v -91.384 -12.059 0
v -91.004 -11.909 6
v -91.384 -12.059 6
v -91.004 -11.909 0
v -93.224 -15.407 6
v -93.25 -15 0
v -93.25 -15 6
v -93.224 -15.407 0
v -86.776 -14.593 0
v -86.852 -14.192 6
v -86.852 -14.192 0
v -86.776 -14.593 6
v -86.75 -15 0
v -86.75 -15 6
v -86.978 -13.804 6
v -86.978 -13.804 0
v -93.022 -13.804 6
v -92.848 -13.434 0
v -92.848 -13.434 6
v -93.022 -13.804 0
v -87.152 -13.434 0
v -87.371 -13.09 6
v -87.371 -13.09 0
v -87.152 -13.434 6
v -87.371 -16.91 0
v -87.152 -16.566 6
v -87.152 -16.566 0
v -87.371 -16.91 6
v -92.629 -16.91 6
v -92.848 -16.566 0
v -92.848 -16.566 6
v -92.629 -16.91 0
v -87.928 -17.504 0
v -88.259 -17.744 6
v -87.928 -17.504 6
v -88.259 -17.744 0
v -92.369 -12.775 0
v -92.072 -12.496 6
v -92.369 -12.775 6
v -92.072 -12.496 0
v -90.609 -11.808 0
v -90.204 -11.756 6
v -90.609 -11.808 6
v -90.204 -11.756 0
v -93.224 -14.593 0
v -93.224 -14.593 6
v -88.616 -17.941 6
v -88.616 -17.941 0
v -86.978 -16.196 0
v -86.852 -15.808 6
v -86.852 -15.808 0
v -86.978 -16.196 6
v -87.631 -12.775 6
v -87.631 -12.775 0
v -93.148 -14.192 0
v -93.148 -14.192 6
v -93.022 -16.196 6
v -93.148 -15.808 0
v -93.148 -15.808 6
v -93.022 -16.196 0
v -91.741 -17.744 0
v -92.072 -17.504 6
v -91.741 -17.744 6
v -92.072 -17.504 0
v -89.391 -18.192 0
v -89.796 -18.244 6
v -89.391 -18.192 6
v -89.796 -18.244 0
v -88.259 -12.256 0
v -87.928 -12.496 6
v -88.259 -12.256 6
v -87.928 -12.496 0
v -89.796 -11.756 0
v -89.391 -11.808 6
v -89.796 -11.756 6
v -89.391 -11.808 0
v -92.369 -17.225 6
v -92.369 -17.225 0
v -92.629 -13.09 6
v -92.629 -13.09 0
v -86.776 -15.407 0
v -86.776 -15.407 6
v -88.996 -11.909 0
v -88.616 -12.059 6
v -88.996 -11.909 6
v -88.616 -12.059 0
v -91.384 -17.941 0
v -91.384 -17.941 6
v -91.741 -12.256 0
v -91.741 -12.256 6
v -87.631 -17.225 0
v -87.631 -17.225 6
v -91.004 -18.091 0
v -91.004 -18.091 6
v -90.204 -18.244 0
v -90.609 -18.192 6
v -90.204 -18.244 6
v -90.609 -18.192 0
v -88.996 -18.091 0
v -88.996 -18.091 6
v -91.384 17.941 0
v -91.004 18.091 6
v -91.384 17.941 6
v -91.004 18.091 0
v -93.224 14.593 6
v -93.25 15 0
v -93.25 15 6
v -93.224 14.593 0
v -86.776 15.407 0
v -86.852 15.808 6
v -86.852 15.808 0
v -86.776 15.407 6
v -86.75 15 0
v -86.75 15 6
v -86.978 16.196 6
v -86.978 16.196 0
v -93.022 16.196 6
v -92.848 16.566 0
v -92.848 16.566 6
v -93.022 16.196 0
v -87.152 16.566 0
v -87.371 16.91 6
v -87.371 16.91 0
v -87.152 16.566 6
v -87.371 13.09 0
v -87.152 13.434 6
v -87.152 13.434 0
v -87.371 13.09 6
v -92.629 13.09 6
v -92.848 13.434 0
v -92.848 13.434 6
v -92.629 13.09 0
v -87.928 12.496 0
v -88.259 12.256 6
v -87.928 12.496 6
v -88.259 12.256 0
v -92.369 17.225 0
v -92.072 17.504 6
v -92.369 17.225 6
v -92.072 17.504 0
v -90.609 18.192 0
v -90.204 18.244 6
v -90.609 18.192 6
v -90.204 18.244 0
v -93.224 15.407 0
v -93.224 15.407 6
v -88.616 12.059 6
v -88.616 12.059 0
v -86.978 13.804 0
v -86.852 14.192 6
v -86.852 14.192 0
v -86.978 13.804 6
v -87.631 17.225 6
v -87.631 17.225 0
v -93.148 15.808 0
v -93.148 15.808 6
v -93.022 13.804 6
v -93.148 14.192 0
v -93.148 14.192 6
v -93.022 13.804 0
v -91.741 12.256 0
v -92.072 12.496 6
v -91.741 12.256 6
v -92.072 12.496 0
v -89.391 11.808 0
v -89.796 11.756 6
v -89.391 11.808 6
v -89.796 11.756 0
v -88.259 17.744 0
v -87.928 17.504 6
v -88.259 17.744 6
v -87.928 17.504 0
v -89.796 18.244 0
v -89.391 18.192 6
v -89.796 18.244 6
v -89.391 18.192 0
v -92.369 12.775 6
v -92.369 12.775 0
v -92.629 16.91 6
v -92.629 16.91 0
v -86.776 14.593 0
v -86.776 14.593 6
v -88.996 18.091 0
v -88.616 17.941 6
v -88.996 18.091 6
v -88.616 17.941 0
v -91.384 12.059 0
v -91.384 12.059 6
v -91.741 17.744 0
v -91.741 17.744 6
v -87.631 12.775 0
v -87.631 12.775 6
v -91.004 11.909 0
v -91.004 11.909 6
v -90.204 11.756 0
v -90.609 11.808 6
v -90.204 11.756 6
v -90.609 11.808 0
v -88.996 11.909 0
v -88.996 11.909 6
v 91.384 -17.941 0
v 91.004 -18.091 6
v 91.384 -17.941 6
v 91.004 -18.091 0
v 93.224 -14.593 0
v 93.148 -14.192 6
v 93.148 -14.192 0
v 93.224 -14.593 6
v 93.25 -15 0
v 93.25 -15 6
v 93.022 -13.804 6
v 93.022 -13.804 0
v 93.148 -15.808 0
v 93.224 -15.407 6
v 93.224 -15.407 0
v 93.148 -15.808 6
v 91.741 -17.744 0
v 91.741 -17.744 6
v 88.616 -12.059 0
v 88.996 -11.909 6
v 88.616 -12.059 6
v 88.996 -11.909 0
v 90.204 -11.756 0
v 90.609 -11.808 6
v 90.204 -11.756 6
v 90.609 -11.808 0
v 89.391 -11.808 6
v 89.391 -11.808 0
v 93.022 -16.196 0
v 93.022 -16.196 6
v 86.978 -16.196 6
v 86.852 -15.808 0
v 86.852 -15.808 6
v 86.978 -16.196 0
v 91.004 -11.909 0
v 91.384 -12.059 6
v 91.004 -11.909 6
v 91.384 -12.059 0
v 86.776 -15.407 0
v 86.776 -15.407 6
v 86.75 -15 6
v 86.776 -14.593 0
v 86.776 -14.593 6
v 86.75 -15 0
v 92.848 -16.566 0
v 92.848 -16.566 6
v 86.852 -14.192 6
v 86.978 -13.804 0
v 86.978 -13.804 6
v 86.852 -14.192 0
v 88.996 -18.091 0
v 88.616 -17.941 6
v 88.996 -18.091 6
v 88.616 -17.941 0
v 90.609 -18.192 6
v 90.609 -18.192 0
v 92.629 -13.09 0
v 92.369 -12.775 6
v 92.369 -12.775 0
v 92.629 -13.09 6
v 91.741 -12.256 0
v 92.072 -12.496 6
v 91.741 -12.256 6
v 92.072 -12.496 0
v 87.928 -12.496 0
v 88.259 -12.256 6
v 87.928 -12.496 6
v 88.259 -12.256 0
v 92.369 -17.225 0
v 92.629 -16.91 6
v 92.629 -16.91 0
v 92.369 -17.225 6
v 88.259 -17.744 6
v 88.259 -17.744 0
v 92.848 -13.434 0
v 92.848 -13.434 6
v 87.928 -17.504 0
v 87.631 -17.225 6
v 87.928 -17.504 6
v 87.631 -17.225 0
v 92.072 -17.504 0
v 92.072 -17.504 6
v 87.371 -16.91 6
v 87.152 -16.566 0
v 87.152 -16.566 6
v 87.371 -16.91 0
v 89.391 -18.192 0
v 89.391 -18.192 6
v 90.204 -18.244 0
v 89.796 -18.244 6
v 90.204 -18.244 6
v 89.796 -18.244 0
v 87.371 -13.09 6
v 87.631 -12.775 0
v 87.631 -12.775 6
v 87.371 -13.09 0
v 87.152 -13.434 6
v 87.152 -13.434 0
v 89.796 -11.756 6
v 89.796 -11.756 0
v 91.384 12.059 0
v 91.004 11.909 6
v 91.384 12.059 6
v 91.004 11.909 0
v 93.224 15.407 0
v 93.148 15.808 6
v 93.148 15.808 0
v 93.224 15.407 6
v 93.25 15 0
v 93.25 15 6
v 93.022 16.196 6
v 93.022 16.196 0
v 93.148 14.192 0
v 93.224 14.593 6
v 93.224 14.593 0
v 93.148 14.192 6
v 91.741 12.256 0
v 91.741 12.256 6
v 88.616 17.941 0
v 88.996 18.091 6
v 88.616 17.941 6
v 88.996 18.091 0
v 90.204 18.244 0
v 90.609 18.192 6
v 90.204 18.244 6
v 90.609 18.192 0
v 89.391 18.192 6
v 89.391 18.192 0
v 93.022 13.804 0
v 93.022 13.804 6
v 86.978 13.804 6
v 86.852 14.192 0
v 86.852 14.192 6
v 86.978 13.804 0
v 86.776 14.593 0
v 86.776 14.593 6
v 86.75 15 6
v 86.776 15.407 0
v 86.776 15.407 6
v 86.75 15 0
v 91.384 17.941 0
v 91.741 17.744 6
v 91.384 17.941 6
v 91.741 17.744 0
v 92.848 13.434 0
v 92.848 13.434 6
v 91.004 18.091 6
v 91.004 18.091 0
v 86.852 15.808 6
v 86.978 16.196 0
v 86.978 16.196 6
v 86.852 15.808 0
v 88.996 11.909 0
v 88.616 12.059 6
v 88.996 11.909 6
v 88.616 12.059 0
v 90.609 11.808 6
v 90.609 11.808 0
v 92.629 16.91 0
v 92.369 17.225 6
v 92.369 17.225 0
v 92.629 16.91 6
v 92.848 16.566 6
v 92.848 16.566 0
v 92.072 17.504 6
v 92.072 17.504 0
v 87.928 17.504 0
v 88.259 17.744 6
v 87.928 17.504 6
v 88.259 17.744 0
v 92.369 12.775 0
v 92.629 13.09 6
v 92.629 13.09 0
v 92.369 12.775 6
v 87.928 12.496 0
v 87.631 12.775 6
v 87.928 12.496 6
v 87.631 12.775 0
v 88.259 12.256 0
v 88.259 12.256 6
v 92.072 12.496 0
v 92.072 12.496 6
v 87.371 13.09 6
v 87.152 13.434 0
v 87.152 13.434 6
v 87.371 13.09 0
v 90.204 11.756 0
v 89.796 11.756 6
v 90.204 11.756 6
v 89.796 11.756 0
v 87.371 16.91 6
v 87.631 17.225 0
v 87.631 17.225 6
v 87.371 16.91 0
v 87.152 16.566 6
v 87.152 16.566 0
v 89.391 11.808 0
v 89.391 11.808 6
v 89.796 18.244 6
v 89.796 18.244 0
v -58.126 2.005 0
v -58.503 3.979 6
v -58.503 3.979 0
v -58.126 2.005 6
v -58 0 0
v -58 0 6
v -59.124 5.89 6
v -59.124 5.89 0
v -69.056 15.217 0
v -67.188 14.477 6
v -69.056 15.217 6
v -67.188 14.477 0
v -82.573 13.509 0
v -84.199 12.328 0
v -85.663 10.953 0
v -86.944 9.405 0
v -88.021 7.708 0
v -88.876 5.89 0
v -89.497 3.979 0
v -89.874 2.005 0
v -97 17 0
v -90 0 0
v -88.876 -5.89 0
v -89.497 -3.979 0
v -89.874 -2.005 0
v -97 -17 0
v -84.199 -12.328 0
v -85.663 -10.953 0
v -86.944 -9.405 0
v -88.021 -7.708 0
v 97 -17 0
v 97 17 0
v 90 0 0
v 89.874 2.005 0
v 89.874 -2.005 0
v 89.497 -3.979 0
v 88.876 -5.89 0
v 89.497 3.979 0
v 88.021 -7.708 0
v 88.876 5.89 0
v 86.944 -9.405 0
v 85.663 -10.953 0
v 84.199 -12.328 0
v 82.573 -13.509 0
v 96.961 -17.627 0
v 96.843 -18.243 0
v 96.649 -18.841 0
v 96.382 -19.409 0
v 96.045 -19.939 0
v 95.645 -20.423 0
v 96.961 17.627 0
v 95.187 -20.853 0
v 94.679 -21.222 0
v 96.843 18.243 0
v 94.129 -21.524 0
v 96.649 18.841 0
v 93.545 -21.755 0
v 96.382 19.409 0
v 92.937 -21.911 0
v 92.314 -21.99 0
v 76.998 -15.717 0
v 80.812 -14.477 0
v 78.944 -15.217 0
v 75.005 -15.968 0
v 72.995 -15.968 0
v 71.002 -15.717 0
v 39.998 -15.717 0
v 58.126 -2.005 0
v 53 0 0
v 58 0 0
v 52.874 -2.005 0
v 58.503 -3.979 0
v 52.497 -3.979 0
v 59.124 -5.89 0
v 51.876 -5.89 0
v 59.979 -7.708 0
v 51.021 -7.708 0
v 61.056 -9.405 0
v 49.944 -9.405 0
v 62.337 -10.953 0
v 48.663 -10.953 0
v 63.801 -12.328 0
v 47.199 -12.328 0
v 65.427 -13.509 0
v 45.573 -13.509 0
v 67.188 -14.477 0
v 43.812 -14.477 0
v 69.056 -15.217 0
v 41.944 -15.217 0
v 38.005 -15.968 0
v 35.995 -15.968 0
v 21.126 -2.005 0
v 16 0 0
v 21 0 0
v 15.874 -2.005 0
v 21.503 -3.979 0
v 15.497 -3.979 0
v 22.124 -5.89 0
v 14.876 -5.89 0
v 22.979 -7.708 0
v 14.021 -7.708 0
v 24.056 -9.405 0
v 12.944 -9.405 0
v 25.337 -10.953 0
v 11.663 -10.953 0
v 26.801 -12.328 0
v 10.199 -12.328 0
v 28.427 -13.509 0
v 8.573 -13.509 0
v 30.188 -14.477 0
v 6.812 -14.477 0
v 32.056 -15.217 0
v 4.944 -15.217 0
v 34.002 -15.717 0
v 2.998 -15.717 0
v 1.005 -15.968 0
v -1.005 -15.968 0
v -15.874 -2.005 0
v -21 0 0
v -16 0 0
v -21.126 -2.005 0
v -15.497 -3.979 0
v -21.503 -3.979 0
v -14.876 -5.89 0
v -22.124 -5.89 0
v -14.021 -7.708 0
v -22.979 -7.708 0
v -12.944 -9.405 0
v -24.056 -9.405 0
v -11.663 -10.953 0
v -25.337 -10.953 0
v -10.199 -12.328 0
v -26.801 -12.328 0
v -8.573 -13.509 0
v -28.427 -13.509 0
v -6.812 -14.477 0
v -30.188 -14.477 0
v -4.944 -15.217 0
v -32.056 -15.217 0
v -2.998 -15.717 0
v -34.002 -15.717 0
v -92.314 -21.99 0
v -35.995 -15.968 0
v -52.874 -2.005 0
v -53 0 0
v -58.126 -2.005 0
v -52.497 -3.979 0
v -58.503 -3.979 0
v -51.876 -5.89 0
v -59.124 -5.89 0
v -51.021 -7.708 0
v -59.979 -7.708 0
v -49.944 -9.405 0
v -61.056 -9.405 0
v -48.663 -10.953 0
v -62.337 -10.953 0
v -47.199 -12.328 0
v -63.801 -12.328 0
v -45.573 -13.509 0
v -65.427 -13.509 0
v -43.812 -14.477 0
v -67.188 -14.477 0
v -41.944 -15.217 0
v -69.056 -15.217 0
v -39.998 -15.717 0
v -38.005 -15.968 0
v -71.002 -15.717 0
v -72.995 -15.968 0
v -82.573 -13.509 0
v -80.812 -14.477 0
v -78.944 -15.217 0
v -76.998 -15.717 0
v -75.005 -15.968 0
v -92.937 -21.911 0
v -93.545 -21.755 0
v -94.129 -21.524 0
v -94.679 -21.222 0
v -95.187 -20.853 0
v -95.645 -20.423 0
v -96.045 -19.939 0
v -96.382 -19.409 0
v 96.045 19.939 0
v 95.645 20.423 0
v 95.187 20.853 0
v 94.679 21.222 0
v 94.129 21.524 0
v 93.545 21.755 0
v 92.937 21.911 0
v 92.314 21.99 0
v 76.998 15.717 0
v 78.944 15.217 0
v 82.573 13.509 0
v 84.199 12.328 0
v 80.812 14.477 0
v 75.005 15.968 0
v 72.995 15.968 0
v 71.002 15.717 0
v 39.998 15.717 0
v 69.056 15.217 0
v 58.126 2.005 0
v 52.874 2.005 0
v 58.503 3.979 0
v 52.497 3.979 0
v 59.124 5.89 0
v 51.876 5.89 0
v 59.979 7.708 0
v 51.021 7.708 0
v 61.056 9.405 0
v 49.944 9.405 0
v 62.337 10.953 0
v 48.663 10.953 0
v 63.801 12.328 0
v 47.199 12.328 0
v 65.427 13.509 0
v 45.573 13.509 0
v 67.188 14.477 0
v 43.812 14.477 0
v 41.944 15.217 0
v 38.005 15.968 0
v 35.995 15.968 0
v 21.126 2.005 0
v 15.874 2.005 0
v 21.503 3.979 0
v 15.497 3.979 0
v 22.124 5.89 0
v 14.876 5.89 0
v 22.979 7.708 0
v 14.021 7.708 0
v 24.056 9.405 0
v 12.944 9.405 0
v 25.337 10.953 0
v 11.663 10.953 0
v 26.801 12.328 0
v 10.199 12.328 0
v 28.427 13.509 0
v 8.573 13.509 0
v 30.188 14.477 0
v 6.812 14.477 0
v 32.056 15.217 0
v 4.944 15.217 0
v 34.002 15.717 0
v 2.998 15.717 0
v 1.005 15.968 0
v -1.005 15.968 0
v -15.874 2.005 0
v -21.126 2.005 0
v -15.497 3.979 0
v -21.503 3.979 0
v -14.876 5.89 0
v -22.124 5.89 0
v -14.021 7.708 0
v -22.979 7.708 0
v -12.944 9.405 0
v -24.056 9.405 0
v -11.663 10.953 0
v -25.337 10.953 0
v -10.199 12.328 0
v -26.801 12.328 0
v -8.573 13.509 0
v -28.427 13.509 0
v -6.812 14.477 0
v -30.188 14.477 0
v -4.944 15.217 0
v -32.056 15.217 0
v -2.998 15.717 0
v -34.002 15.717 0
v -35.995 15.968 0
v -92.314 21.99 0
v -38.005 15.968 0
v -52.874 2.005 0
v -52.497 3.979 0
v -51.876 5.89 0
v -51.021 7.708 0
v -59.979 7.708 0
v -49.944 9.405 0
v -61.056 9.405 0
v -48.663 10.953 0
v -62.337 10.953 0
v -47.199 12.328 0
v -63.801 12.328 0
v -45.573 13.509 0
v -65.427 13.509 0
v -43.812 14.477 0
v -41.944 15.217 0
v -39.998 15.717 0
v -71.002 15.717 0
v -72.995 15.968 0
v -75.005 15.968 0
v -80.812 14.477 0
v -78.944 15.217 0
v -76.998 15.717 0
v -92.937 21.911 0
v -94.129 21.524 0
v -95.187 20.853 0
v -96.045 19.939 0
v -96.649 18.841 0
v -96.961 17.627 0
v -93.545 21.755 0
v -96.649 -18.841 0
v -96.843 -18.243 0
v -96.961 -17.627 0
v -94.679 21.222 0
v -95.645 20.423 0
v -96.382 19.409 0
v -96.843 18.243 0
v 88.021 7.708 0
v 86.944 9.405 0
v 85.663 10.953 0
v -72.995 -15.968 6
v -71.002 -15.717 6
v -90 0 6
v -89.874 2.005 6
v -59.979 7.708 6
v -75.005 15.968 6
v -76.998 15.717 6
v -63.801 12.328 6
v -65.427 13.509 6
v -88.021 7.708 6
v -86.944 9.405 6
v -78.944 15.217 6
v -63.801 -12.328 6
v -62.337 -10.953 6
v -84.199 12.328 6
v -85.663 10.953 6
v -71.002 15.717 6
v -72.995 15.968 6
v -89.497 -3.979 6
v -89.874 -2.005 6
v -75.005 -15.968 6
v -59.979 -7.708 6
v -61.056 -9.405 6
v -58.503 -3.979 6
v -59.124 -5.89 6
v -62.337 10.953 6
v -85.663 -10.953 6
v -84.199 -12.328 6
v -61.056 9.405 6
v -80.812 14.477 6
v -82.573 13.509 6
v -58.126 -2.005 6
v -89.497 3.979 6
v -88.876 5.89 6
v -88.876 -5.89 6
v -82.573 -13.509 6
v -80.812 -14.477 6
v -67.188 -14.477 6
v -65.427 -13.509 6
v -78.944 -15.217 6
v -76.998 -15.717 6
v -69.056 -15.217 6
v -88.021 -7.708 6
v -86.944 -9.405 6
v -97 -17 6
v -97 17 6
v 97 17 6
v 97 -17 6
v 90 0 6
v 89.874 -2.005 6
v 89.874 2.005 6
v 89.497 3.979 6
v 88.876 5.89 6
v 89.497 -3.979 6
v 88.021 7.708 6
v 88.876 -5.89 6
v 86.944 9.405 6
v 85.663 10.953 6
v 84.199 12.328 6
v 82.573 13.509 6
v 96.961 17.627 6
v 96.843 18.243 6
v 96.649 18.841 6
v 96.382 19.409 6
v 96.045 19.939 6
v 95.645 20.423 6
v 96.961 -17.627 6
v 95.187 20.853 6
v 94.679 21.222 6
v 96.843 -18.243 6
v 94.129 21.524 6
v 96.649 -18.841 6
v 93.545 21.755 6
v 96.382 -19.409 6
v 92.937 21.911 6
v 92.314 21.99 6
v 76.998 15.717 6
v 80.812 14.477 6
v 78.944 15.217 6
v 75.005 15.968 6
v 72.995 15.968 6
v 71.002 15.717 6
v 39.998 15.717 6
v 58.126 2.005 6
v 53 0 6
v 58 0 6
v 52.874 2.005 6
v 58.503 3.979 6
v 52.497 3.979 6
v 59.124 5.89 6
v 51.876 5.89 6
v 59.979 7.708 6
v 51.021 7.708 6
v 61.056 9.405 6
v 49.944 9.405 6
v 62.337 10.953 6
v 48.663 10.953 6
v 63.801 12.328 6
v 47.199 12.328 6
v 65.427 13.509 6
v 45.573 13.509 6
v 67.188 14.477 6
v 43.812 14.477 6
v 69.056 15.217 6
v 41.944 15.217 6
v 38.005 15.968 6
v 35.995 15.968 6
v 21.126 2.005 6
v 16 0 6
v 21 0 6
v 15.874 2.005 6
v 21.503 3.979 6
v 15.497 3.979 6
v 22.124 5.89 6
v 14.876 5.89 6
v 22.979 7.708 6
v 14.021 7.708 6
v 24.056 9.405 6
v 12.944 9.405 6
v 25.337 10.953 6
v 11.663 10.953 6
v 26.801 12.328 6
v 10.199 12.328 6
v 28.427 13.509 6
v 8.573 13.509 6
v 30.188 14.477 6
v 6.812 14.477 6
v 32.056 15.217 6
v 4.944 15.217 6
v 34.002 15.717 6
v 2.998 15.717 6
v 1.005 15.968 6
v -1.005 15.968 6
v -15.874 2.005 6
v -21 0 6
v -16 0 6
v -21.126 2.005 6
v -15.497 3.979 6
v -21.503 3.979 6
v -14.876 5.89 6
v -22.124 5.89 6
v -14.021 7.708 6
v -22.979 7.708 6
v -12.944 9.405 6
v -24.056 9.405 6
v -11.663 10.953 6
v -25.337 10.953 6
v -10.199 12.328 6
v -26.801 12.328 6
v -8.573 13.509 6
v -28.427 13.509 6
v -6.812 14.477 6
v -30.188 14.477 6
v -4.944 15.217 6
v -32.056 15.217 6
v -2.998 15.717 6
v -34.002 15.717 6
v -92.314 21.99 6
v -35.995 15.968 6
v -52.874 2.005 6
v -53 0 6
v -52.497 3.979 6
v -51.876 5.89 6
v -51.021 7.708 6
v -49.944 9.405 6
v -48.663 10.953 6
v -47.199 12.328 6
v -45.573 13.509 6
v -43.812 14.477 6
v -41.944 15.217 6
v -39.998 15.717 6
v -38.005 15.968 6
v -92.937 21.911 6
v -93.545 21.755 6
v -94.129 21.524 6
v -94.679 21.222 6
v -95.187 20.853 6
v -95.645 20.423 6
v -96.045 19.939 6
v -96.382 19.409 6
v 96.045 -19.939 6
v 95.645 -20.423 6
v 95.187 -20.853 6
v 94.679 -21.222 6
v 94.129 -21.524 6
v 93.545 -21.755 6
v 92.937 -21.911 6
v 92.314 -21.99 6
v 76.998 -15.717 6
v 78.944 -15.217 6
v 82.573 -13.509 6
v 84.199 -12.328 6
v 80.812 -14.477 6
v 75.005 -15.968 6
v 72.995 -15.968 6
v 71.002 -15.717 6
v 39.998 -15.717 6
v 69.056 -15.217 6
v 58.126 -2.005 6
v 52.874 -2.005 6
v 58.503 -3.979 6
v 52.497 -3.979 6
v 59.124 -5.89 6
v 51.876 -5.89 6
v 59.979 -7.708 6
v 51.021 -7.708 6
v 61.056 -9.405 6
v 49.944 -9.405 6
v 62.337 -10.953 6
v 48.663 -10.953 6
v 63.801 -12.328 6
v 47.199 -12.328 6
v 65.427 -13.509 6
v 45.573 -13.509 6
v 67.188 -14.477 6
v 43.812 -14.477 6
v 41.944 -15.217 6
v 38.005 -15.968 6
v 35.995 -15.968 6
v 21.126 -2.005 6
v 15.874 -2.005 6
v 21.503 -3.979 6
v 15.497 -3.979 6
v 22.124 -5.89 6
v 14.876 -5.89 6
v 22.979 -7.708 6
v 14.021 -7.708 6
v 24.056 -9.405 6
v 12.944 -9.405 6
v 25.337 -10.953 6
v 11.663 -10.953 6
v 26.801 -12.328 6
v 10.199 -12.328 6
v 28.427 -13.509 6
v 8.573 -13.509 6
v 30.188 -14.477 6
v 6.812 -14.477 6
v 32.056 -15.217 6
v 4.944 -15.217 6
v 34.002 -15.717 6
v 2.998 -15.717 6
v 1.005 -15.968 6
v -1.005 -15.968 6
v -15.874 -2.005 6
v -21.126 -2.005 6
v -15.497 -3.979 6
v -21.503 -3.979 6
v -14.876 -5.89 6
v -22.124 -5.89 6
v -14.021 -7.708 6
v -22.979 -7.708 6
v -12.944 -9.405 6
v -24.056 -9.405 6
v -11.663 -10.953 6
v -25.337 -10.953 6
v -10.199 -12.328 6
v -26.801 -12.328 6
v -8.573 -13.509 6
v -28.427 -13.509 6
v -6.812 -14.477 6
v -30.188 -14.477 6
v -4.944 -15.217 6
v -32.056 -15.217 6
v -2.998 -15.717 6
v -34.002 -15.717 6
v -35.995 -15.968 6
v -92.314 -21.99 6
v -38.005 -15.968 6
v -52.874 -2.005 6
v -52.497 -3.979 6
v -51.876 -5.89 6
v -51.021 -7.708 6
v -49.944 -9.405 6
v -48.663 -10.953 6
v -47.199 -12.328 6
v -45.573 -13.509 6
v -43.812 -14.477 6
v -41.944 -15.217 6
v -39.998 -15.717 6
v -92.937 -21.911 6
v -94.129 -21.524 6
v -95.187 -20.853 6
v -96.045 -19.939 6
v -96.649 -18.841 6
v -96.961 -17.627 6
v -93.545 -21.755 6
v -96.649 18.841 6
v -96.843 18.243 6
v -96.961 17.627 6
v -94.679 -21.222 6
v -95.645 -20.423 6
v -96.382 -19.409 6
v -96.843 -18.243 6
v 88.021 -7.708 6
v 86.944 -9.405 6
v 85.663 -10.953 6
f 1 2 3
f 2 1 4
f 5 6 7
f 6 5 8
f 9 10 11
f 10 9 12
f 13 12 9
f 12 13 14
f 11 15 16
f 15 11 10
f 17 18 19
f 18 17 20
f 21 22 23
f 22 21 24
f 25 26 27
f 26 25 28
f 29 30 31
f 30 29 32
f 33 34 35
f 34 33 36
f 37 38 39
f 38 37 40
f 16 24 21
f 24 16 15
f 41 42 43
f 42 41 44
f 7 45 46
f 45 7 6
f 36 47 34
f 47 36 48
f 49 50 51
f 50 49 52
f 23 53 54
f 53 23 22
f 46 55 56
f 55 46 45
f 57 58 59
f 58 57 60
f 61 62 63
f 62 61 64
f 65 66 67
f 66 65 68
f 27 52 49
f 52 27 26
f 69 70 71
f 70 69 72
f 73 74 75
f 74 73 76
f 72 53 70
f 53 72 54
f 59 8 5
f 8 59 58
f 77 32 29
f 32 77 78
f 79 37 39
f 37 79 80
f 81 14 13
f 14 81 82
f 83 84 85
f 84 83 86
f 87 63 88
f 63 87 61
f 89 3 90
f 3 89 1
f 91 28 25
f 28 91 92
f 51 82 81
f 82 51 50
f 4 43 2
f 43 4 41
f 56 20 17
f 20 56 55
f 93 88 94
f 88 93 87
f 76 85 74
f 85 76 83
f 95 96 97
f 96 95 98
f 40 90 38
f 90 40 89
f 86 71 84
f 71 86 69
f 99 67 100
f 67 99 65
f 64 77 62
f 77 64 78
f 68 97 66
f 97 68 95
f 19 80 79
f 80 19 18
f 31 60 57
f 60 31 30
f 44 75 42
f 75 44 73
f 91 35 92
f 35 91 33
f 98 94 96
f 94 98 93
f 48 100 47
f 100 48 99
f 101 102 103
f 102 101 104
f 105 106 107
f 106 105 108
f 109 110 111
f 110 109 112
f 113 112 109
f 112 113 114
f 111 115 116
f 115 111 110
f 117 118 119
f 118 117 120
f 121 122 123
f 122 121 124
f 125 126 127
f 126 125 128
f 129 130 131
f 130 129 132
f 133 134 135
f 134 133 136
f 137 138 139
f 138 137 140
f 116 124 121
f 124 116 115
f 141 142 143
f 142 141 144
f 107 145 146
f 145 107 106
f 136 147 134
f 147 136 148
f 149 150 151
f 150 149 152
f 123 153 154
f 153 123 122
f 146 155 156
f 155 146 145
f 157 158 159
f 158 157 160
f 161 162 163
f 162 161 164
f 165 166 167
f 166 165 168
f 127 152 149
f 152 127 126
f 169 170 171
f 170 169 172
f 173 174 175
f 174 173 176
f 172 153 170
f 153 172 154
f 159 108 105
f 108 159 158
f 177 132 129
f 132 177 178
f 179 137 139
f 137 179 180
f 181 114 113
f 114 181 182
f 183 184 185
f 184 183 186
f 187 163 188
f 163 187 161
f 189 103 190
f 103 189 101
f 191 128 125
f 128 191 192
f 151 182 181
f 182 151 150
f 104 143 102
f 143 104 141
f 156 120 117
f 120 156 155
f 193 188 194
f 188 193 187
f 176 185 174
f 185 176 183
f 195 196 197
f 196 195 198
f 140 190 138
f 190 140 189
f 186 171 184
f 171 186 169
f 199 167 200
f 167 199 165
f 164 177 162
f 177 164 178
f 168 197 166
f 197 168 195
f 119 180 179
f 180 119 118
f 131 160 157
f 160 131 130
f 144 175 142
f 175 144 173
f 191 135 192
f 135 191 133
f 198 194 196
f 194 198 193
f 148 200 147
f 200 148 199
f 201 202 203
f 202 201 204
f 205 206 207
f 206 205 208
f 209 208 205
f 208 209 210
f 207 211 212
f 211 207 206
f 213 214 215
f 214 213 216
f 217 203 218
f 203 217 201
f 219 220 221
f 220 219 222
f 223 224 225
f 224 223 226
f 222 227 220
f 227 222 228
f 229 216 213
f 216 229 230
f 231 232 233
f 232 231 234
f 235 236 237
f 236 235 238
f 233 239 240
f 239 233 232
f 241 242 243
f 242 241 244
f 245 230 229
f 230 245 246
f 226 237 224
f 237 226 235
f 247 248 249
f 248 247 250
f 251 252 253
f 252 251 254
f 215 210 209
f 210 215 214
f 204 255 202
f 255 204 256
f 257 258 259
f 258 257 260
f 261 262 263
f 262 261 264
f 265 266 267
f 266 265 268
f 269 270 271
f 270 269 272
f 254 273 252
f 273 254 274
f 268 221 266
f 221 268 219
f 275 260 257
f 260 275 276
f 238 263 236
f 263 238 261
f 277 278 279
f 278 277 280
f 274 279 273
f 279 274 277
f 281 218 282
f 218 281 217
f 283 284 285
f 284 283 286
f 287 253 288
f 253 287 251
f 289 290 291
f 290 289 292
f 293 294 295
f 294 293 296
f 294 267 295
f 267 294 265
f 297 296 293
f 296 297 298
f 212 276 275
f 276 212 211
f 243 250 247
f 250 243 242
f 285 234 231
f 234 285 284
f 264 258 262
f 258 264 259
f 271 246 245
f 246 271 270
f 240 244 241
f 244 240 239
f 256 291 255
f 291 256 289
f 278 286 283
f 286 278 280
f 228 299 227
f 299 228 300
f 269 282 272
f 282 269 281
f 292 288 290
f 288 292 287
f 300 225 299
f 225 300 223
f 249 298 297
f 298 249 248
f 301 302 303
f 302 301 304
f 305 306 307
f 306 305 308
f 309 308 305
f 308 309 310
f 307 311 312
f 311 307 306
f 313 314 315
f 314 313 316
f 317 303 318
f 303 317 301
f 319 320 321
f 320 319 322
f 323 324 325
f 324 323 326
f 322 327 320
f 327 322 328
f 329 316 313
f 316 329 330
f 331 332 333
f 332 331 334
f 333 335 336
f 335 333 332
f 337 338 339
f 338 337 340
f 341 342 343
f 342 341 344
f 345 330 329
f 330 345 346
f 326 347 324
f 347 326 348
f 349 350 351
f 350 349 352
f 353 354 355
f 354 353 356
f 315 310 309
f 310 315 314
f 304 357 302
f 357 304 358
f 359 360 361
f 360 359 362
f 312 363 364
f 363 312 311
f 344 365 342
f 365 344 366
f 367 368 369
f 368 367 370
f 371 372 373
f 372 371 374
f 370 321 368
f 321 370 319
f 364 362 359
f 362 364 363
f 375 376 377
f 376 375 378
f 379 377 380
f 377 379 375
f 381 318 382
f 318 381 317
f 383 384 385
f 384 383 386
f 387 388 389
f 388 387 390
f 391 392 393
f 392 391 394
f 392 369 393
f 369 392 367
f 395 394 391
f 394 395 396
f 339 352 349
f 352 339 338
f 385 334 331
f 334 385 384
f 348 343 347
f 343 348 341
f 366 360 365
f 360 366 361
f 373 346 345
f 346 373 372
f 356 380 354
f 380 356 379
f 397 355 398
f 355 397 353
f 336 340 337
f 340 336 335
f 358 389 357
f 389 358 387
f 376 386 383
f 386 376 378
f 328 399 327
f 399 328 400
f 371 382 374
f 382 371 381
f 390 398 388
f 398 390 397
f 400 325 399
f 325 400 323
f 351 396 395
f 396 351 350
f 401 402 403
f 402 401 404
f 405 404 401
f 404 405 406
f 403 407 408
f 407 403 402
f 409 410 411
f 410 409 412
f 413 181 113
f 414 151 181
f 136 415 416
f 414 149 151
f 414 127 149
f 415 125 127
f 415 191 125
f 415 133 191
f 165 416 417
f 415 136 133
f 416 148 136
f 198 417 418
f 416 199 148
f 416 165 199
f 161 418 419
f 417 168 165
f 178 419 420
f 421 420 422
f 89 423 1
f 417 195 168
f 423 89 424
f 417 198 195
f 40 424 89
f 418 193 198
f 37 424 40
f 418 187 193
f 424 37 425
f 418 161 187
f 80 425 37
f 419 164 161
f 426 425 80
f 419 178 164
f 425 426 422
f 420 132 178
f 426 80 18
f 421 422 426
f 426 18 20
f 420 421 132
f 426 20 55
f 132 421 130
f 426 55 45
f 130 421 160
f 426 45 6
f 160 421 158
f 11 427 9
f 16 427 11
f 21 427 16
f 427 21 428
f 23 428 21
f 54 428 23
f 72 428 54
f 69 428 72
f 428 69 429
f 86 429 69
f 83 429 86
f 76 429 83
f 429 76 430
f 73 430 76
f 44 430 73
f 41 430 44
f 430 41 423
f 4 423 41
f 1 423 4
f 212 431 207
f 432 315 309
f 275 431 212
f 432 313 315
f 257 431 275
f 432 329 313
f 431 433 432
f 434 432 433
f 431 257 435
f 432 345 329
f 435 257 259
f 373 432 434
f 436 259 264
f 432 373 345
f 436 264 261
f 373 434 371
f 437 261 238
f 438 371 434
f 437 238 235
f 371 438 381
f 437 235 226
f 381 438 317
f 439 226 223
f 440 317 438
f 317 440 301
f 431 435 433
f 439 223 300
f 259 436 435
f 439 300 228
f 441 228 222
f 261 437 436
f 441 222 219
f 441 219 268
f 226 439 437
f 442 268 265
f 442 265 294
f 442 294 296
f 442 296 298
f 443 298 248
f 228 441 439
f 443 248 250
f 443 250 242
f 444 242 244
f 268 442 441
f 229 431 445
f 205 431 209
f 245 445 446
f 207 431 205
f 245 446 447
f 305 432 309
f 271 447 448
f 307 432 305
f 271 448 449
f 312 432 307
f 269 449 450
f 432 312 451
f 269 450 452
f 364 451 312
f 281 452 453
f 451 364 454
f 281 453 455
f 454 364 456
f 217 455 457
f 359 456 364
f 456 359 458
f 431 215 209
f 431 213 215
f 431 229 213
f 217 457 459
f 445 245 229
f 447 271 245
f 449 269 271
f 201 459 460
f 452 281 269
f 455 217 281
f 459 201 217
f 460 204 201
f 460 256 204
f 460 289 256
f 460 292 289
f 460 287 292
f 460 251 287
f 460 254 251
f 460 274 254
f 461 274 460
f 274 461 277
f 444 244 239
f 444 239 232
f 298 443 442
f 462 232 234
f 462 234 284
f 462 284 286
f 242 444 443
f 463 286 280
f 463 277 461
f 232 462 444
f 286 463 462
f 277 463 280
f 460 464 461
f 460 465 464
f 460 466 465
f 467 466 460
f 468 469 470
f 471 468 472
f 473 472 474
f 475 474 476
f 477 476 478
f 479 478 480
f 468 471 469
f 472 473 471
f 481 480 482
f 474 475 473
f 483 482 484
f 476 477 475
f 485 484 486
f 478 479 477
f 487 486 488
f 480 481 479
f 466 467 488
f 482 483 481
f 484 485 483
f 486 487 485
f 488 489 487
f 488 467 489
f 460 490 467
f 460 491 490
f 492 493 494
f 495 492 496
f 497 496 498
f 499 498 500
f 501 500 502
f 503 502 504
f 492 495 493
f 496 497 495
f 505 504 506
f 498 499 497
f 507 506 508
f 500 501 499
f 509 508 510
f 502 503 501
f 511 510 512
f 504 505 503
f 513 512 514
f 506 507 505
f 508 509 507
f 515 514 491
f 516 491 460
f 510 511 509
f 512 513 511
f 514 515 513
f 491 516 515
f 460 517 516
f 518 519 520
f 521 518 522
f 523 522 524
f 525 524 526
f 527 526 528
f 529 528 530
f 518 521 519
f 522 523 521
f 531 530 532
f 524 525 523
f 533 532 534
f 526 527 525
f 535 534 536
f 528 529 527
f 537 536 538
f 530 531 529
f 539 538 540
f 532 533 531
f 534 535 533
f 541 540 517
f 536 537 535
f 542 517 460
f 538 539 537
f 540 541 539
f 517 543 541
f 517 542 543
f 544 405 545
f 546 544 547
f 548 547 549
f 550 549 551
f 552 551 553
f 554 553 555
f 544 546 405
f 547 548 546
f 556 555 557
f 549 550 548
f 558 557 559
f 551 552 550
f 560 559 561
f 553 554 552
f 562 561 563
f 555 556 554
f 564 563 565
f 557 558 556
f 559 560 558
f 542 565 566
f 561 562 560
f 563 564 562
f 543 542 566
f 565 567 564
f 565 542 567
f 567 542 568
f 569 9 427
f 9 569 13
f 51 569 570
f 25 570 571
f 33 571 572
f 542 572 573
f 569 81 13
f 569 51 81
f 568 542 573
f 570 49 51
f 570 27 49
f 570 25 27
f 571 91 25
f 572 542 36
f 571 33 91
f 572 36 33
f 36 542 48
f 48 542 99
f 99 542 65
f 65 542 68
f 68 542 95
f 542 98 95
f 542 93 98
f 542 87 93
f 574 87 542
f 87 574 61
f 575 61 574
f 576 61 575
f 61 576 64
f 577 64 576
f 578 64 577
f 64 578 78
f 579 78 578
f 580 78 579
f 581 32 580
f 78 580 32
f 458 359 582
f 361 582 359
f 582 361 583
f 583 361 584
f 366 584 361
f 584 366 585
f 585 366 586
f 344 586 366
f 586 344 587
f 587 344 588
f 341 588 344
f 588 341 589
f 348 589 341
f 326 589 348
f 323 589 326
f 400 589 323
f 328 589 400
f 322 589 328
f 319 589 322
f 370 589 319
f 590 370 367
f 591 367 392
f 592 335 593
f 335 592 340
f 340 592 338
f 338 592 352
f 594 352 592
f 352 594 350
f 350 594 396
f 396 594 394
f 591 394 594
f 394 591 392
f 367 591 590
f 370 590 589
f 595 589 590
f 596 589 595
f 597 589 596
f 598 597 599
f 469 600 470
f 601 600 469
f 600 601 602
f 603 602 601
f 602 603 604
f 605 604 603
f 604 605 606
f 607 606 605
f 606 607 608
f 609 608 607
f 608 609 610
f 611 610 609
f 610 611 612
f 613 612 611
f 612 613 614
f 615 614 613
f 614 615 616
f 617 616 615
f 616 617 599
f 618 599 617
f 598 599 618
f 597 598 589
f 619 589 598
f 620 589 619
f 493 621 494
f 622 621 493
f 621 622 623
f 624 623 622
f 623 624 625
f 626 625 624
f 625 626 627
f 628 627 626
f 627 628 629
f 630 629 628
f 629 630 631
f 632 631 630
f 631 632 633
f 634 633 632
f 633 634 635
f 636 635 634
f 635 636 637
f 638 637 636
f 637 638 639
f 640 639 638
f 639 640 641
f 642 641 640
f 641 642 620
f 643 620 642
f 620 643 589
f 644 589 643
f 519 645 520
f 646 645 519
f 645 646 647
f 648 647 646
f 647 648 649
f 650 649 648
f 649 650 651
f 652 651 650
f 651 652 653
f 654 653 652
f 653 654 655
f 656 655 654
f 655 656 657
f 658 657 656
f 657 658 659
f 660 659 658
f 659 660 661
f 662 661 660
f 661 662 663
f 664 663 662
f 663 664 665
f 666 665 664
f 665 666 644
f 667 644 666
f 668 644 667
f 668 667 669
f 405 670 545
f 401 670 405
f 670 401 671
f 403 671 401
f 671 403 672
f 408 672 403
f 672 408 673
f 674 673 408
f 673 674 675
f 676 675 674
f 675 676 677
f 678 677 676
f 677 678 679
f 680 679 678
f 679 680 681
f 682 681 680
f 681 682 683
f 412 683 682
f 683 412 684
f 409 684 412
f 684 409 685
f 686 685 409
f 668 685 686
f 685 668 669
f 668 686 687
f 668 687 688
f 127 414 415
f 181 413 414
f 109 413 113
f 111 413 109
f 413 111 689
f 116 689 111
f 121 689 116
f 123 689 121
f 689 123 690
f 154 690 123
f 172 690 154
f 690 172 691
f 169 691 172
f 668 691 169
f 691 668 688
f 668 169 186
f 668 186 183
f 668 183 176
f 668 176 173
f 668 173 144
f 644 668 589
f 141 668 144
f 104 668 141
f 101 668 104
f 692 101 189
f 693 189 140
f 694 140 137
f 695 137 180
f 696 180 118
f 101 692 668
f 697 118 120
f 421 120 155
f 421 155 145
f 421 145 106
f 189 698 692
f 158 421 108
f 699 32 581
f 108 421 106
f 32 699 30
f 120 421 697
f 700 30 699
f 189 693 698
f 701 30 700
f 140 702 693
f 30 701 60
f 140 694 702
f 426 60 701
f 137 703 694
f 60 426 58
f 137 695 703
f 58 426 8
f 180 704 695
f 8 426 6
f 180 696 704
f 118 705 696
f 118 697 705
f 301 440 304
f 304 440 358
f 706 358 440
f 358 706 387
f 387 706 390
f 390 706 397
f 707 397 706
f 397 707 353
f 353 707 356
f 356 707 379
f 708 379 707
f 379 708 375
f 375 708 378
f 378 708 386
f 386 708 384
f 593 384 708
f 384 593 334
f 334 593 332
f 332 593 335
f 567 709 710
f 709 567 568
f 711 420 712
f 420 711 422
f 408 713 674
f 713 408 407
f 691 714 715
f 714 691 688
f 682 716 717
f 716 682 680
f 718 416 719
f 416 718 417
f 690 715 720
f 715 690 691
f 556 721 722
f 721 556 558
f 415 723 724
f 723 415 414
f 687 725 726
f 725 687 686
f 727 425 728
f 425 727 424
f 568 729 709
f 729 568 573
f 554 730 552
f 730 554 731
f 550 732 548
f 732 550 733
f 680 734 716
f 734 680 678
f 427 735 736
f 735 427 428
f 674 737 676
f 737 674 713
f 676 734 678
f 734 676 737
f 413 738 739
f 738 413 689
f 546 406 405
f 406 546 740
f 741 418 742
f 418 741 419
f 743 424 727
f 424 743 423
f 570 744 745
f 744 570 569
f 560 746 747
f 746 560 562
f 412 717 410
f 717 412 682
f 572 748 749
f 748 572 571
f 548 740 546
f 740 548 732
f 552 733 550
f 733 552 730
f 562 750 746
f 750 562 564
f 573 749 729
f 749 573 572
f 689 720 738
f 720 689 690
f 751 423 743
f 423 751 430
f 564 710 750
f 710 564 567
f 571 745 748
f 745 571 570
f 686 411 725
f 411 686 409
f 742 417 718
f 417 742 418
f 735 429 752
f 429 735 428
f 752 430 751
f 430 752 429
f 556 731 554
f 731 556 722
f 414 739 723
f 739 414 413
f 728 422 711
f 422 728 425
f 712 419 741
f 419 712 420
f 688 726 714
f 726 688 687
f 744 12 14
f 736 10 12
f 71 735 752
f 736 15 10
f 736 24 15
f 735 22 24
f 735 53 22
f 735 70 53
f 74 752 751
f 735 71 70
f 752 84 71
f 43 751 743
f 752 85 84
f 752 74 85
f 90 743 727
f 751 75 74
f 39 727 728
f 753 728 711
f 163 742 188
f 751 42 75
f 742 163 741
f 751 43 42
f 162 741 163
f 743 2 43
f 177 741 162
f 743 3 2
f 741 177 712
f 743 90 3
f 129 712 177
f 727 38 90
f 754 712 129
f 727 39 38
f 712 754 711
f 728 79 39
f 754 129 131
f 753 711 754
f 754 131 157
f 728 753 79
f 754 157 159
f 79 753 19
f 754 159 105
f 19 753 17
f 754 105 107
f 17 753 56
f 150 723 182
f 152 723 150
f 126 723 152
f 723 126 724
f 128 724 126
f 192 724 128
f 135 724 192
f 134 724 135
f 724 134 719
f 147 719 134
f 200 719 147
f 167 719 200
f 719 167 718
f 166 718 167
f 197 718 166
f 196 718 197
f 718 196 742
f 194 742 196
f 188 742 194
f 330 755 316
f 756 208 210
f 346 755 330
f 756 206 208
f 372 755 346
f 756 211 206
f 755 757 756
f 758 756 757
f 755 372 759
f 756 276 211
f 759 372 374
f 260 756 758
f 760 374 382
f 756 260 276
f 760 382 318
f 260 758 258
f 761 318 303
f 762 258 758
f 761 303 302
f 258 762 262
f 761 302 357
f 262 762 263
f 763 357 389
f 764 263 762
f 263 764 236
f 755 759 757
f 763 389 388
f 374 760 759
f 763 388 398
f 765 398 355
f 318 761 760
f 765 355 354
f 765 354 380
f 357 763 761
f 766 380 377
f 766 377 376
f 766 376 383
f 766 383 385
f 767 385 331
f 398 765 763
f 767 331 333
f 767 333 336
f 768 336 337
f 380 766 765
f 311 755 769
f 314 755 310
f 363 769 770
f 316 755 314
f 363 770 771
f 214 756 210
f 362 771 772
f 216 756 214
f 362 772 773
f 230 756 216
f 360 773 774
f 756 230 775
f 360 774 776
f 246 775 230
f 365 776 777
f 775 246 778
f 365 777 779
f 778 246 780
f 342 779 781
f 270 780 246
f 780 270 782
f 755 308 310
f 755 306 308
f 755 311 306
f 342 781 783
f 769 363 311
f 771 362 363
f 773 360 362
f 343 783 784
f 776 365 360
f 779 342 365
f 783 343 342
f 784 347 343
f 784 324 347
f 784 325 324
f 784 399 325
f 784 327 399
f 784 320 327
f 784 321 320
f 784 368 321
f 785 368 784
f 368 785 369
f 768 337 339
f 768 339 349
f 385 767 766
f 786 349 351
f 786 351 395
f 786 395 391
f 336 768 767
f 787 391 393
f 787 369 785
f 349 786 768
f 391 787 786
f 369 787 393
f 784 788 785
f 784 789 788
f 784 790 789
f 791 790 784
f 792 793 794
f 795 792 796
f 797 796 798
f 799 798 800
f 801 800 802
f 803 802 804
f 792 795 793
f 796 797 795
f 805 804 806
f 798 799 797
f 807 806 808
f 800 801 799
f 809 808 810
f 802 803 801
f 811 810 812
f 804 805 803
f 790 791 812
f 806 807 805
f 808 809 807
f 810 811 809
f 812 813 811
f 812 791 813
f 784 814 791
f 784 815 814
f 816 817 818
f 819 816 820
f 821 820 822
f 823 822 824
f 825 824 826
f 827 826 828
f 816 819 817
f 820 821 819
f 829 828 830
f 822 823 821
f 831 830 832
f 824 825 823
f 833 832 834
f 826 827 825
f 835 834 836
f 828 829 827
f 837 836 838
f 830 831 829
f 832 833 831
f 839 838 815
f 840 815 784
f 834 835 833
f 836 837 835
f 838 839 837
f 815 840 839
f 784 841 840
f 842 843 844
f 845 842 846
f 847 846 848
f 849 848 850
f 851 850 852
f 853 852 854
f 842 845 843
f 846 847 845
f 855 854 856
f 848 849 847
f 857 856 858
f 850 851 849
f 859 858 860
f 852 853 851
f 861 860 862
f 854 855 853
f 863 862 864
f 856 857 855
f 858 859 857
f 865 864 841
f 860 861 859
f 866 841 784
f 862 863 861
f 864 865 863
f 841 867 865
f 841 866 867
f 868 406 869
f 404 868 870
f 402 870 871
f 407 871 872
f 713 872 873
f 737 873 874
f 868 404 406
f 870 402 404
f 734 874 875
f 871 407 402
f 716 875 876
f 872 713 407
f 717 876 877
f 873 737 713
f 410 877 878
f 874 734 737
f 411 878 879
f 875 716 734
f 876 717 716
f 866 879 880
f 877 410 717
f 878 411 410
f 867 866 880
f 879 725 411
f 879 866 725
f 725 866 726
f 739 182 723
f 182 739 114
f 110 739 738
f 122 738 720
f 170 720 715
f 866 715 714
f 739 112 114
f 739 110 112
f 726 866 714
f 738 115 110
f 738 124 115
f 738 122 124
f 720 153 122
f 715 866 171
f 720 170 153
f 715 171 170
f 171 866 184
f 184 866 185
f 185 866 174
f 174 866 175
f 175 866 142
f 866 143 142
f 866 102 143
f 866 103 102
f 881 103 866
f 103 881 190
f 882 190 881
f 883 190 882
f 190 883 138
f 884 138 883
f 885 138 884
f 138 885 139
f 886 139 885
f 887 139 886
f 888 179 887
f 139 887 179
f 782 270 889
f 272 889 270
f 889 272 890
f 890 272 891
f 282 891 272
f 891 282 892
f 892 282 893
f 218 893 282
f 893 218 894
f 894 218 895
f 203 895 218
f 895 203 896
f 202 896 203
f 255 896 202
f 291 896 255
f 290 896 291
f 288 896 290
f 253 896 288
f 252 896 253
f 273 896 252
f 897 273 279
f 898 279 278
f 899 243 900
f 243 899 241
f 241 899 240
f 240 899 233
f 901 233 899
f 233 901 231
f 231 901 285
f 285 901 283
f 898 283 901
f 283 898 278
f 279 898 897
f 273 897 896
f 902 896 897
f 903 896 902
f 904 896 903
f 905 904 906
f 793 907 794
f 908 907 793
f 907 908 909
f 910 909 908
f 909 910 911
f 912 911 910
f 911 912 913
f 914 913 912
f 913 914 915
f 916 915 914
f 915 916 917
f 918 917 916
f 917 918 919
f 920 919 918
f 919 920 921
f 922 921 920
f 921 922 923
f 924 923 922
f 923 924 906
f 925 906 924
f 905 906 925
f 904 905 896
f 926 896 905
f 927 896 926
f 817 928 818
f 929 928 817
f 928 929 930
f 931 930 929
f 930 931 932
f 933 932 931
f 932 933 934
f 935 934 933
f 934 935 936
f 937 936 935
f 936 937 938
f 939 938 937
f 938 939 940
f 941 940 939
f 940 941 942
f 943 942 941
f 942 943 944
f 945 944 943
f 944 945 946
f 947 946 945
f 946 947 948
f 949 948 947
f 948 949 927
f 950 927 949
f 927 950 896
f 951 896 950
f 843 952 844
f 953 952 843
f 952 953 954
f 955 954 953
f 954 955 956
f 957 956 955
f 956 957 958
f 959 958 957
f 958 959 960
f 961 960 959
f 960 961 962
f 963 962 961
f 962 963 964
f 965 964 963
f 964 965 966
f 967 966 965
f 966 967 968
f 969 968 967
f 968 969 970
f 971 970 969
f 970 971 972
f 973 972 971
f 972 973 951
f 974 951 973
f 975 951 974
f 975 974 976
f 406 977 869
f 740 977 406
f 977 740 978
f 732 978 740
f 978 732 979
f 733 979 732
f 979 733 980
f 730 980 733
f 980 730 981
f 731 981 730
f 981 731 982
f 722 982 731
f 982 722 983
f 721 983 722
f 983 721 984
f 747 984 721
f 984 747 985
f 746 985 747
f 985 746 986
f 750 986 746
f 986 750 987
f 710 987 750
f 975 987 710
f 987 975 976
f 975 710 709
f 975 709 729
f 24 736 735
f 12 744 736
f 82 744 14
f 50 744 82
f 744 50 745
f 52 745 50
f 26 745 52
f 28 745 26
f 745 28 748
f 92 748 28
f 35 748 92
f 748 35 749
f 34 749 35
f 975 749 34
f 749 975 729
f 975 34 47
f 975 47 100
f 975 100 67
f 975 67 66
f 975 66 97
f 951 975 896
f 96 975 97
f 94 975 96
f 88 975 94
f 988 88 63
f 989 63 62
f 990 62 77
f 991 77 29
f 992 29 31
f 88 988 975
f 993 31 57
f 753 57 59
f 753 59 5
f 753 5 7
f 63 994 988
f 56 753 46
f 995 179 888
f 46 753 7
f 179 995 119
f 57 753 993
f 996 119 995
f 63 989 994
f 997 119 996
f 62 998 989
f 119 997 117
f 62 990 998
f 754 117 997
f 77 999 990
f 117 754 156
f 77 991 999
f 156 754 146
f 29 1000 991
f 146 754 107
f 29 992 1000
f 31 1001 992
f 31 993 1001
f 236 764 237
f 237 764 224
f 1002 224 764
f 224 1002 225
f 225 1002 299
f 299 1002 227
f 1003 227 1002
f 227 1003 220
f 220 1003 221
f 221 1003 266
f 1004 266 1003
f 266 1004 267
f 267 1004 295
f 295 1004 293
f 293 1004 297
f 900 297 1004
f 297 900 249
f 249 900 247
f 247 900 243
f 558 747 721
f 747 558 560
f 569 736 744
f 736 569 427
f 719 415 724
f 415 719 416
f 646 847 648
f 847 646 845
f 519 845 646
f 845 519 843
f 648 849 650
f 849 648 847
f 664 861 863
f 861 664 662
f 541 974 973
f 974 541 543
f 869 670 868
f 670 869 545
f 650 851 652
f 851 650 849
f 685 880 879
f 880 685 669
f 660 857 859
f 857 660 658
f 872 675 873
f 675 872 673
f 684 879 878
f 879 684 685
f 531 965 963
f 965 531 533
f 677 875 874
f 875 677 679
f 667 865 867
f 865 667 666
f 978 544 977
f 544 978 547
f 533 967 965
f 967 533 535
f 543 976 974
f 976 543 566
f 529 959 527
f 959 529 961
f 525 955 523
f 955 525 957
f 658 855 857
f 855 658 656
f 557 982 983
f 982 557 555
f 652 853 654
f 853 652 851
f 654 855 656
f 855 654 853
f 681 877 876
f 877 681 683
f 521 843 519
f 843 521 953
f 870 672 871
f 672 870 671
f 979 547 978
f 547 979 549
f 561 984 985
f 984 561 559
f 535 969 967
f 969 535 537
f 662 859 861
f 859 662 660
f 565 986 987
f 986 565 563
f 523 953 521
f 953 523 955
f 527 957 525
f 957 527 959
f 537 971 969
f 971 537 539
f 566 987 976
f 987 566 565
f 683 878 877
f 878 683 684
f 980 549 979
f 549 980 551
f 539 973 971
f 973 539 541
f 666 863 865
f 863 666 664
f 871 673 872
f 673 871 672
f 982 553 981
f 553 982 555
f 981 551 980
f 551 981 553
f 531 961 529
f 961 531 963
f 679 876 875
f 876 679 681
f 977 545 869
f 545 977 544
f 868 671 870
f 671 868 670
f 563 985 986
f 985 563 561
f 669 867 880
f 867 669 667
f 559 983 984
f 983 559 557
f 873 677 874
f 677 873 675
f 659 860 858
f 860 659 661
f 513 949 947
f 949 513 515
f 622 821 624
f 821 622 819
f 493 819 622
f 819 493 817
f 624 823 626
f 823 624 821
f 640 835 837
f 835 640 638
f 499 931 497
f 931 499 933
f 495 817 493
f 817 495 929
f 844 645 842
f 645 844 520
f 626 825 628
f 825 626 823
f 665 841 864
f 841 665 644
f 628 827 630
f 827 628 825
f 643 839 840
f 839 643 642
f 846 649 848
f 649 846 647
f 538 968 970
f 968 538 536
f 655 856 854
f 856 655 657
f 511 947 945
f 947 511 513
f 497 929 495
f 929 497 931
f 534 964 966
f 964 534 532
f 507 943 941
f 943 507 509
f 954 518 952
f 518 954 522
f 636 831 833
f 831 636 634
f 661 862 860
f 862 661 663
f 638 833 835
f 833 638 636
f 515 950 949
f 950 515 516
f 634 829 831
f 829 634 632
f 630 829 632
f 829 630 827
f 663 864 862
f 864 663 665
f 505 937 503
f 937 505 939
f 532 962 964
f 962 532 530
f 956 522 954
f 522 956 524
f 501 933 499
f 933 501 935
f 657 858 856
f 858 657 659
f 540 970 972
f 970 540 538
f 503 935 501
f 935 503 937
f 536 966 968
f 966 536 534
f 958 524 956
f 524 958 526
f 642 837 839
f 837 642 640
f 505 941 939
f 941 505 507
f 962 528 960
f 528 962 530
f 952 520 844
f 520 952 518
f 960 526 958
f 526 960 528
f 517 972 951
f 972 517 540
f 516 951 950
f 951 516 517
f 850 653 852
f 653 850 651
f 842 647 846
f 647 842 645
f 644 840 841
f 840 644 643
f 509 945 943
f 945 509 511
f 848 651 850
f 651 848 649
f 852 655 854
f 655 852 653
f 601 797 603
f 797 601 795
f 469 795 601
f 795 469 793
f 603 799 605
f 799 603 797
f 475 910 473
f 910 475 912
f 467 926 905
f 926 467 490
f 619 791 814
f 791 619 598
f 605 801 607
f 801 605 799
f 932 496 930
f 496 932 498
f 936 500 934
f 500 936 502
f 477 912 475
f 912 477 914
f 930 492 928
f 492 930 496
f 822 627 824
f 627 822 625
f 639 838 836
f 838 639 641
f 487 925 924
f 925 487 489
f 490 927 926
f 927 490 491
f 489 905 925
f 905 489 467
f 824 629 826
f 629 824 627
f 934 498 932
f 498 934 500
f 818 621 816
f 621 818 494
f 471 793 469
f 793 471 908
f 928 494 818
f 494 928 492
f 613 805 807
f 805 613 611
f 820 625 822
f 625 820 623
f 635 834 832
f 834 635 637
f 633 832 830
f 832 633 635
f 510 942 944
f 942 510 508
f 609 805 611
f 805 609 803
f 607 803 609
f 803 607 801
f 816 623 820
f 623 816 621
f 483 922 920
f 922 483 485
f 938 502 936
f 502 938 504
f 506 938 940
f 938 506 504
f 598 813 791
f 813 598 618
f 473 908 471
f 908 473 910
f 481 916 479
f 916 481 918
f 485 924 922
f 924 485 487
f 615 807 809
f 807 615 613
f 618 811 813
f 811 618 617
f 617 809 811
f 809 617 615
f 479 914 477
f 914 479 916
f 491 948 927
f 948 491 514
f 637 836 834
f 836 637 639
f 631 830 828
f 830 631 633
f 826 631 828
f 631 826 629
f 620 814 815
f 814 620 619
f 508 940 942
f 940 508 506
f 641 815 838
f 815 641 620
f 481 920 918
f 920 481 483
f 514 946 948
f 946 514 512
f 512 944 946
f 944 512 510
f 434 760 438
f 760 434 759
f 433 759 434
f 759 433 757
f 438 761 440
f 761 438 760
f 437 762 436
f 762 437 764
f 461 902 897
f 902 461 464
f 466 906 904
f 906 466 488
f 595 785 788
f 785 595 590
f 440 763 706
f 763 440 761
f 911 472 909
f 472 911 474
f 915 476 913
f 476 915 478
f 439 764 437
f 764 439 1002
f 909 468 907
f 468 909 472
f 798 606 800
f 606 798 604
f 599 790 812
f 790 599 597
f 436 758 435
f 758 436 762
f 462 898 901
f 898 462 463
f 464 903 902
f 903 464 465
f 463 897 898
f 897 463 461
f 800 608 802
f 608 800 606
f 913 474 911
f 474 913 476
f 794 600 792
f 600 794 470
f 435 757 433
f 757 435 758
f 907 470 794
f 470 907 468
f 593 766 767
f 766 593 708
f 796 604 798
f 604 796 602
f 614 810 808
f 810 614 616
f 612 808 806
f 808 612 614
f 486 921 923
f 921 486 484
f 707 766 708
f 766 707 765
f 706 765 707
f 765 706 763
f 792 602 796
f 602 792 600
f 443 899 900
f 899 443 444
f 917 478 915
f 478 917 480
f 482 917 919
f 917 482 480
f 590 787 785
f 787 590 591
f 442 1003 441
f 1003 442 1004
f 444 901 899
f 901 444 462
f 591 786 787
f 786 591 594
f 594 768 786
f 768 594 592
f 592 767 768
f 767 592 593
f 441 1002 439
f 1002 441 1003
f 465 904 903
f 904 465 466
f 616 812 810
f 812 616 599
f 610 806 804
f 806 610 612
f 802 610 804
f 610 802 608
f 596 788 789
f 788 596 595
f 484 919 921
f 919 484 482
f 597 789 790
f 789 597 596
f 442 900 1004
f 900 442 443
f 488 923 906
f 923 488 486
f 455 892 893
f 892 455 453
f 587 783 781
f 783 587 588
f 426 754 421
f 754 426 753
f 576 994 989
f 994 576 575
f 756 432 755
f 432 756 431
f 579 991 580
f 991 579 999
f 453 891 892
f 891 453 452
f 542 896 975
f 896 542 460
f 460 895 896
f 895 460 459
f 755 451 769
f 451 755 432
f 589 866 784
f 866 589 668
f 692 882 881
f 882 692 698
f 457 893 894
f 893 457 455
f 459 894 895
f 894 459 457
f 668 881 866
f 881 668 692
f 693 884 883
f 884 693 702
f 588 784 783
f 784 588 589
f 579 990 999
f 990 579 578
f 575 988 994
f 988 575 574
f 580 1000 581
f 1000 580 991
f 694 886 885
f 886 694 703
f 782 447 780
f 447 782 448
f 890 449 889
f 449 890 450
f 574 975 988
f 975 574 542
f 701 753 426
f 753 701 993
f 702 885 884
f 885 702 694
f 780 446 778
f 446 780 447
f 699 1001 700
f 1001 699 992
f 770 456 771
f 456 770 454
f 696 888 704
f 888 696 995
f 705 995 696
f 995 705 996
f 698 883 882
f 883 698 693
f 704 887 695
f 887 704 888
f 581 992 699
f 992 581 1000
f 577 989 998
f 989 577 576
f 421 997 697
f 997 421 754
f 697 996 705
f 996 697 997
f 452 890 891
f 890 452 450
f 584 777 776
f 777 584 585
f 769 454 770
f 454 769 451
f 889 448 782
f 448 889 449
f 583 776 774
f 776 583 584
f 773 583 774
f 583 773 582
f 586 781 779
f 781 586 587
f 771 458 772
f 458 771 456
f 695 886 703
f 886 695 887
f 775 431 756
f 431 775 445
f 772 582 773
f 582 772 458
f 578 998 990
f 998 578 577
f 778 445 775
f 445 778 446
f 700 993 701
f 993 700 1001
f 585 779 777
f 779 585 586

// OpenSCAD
$fn = 50;

difference() {
	union() {
		hull() {
			translate(v = [-92.0, 17.0, 0]) {
				cylinder(h = 6, r = 5);
			}
			translate(v = [92.0, 17.0, 0]) {
				cylinder(h = 6, r = 5);
			}
			translate(v = [-92.0, -17.0, 0]) {
				cylinder(h = 6, r = 5);
			}
			translate(v = [92.0, -17.0, 0]) {
				cylinder(h = 6, r = 5);
			}
		}
	}
	union() {
		translate(v = [-90.0, -15.0, -100.0]) {
			cylinder(h = 200, r = 3.25);
		}
		translate(v = [-90.0, 15.0, -100.0]) {
			cylinder(h = 200, r = 3.25);
		}
		translate(v = [90.0, -15.0, -100.0]) {
			cylinder(h = 200, r = 3.25);
		}
		translate(v = [90.0, 15.0, -100.0]) {
			cylinder(h = 200, r = 3.25);
		}
		translate(v = [-90.0, -15.0, -100.0]) {
			cylinder(h = 200, r = 1.8);
		}
		translate(v = [-90.0, 15.0, -100.0]) {
			cylinder(h = 200, r = 1.8);
		}
		translate(v = [90.0, -15.0, -100.0]) {
			cylinder(h = 200, r = 1.8);
		}
		translate(v = [90.0, 15.0, -100.0]) {
			cylinder(h = 200, r = 1.8);
		}
		translate(v = [-74.0, 0, 0.0]) {
			cylinder(h = 6, r = 16.0);
		}
		translate(v = [-37.0, 0, 0.0]) {
			cylinder(h = 6, r = 16.0);
		}
		cylinder(h = 6, r = 16.0);
		translate(v = [37.0, 0, 0.0]) {
			cylinder(h = 6, r = 16.0);
		}
		translate(v = [74.0, 0, 0.0]) {
			cylinder(h = 6, r = 16.0);
		}
	}
}
